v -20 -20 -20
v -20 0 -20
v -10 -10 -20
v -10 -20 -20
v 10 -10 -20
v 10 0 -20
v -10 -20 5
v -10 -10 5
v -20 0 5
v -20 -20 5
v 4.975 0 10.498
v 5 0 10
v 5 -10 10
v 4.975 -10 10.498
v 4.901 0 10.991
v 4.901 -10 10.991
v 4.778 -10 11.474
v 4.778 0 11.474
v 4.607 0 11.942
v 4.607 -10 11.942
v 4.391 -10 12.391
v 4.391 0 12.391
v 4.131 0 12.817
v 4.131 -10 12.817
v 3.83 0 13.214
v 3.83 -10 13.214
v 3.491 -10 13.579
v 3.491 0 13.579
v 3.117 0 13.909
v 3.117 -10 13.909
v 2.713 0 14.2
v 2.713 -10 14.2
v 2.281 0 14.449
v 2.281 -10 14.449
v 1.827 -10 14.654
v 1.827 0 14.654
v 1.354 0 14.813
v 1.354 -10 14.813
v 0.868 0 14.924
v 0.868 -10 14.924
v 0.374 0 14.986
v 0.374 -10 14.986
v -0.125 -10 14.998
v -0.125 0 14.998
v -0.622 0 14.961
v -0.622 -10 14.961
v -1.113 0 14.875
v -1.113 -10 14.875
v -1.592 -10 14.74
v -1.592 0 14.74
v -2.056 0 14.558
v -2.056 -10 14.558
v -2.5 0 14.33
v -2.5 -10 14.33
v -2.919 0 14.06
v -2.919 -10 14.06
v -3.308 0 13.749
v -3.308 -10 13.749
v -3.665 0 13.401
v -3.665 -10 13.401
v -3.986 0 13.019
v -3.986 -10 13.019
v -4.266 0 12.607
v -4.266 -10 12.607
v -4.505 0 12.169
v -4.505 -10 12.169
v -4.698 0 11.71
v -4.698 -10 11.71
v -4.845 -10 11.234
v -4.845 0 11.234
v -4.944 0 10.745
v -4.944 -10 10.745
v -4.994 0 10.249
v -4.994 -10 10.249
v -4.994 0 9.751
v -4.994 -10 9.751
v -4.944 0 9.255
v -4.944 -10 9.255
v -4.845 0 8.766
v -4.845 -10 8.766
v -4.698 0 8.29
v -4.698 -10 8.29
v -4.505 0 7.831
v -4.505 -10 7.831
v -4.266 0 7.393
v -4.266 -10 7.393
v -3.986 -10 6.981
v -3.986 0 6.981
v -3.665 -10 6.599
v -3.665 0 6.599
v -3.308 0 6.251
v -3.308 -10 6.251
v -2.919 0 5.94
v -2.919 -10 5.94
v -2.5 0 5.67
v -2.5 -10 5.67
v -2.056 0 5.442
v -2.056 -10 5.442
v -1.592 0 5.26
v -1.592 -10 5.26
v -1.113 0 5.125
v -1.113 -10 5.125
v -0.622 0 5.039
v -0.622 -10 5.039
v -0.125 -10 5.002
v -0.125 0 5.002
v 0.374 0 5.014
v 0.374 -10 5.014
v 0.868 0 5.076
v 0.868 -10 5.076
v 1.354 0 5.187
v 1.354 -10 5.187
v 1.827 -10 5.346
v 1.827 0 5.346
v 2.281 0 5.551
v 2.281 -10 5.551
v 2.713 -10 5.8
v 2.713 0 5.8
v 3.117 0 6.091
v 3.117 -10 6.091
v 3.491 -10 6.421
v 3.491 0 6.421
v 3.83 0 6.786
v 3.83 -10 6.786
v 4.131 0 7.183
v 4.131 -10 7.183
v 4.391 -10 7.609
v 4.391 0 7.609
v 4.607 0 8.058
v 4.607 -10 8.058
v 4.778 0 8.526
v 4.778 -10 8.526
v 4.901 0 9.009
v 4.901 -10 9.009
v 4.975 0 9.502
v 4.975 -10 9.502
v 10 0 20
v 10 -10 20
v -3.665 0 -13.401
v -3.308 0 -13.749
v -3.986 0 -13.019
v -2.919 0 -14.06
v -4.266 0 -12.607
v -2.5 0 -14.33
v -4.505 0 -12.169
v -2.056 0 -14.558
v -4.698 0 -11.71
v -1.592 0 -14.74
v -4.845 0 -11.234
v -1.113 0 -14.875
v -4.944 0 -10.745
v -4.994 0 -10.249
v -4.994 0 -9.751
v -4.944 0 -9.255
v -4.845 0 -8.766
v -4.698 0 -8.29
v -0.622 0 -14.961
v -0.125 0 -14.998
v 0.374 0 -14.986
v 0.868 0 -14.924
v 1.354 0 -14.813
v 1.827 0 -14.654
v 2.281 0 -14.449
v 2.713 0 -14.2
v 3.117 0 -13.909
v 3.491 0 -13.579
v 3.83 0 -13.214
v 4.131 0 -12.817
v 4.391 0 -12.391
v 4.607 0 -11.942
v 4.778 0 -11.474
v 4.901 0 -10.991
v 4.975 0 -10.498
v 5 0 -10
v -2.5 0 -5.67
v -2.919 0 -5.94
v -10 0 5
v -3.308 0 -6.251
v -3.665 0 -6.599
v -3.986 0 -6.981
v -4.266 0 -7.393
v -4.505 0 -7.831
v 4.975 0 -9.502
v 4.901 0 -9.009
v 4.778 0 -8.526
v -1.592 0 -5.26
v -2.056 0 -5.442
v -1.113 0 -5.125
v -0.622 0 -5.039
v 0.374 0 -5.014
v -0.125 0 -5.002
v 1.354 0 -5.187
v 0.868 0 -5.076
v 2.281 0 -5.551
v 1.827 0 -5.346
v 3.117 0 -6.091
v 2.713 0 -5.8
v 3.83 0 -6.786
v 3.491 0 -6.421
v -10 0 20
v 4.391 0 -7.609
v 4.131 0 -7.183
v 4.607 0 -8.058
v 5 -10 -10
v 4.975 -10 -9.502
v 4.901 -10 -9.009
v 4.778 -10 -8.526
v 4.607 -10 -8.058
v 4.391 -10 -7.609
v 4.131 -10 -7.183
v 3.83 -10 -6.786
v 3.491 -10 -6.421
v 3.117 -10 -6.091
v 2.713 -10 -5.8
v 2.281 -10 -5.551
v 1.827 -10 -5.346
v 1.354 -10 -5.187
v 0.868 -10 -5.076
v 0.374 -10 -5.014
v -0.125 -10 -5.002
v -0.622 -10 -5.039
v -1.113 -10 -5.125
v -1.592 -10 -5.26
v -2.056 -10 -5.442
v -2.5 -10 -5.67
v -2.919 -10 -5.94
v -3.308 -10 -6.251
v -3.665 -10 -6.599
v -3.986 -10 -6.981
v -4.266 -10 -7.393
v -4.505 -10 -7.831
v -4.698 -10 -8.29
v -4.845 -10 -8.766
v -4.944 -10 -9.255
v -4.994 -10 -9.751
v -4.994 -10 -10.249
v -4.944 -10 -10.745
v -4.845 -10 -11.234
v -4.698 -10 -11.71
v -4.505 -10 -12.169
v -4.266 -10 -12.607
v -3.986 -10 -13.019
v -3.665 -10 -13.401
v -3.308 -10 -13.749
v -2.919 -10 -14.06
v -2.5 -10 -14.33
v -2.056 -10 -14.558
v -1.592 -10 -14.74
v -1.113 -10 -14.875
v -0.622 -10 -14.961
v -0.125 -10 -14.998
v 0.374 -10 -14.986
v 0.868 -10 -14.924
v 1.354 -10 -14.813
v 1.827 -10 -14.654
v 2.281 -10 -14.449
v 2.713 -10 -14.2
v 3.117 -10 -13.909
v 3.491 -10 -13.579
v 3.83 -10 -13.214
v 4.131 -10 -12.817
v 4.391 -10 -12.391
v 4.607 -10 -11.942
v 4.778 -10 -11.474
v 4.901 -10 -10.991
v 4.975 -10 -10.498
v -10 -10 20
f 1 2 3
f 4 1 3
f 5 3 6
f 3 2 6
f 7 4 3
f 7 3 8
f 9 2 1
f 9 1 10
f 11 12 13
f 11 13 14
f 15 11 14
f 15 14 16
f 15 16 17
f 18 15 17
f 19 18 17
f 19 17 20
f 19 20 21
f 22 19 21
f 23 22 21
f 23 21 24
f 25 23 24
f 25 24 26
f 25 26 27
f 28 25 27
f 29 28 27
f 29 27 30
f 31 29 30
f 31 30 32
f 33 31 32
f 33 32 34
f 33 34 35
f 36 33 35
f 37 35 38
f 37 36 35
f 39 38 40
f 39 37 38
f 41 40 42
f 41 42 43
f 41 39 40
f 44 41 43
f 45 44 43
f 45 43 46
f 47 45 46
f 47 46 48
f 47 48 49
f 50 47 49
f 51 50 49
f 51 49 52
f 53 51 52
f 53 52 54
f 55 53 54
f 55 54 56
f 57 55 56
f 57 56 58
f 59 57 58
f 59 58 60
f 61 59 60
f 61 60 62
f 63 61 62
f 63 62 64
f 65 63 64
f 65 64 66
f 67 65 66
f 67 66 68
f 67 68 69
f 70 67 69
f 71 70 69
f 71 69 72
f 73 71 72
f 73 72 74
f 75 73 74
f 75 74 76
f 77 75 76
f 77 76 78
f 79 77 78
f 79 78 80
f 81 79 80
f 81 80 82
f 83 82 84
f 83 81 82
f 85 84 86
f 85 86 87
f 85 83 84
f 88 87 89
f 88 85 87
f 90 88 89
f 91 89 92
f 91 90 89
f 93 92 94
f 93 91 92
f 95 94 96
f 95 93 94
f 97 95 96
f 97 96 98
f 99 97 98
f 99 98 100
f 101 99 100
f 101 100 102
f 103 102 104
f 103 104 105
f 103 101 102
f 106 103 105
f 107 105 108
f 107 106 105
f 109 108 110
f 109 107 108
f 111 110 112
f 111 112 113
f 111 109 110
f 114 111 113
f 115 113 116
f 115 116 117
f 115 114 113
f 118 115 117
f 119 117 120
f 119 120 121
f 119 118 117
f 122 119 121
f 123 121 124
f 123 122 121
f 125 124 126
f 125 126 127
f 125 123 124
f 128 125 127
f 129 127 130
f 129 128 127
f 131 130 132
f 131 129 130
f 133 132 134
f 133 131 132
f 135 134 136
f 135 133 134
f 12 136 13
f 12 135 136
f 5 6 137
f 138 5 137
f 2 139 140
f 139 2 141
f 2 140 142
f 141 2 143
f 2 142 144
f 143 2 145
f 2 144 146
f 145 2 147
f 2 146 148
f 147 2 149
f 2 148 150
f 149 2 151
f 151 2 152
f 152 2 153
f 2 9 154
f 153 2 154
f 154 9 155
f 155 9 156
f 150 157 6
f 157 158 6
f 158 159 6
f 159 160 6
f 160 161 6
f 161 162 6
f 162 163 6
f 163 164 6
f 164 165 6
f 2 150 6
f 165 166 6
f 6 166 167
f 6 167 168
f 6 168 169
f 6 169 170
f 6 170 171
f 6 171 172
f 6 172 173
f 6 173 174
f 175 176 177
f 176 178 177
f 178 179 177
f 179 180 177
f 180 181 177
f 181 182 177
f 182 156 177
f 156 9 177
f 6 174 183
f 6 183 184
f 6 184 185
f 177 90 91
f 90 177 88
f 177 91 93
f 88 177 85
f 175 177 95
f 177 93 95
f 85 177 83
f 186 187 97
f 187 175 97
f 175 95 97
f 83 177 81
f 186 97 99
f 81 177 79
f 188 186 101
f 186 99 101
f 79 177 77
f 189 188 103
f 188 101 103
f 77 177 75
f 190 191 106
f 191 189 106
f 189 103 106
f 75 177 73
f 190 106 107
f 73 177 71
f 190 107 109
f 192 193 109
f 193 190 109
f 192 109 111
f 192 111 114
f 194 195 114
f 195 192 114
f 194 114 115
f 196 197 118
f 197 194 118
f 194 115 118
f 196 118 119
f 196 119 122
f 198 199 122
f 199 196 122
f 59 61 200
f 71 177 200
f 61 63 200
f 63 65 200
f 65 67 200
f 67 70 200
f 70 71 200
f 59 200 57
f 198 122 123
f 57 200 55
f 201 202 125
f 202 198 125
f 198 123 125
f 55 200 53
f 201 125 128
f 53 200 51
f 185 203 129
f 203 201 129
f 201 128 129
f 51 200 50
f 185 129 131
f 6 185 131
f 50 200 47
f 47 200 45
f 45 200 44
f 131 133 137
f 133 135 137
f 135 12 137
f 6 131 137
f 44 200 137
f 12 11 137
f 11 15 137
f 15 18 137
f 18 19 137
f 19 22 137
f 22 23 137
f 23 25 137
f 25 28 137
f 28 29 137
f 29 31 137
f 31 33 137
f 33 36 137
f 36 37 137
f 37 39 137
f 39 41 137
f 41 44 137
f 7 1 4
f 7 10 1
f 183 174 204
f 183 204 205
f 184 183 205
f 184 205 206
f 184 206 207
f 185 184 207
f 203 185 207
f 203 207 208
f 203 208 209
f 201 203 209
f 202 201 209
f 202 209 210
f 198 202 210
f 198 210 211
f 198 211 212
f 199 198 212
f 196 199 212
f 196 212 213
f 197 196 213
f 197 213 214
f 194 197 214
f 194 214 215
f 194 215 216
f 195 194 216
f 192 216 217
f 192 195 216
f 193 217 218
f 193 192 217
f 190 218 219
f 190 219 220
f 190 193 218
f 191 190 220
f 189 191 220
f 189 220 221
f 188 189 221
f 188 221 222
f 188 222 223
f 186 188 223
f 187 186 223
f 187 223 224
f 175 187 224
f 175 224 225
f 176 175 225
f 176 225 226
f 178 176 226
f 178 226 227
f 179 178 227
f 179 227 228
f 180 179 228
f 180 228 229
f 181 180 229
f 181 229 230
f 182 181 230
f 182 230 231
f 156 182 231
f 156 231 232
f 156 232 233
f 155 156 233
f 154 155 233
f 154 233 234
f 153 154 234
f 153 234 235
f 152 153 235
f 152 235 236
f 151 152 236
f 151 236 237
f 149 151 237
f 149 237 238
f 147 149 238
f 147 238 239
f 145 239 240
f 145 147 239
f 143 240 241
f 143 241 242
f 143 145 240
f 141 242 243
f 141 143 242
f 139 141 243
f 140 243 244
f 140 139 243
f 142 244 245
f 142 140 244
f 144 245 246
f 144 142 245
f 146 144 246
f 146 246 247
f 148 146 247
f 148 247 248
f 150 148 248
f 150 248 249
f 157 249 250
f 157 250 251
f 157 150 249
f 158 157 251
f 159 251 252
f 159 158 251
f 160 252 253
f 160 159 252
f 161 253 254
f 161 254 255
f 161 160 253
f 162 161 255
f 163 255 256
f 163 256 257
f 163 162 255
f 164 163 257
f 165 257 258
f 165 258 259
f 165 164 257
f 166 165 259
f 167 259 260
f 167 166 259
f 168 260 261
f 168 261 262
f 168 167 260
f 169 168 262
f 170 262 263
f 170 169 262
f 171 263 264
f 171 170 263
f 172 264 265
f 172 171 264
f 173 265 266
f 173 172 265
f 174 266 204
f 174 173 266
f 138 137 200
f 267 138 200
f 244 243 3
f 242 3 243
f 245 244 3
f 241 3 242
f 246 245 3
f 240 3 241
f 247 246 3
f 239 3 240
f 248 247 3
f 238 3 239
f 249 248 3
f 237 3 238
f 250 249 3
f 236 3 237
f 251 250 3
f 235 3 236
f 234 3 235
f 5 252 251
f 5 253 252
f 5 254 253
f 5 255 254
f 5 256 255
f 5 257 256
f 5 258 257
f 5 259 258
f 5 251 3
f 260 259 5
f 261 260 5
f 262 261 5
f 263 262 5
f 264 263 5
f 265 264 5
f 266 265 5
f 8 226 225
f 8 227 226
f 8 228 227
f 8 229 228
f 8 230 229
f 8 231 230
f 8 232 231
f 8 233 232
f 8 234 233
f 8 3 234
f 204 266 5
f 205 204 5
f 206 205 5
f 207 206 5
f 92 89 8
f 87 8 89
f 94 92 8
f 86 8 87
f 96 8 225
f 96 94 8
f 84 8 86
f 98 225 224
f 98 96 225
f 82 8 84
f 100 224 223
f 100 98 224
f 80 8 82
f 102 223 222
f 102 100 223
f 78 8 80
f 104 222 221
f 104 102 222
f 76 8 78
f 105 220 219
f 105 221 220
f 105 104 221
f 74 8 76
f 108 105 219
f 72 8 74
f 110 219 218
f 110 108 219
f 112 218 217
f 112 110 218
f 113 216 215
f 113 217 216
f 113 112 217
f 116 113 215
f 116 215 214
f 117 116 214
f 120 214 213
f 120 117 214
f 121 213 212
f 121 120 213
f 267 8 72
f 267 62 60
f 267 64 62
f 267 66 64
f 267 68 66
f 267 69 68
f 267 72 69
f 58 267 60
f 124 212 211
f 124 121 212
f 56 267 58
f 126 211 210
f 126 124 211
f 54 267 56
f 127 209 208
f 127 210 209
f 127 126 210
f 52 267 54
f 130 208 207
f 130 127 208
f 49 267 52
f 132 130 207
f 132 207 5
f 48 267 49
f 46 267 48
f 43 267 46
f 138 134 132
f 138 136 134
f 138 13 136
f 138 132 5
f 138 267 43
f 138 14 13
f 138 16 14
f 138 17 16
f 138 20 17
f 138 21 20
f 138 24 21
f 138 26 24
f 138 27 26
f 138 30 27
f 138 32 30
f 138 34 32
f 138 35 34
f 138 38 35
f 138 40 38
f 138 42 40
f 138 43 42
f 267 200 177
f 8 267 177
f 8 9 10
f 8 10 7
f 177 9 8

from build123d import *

# Parameters (mm, degrees)
F0_R      = 5
F1_DEPTH  = 15
F0_W      = 10
F0_H      = 25
F1_FACE_W = 20
F1_FACE_H = 40
F1_FACE_R = 5
F2_DEPTH  = 20
F3_DEPTH  = 25


with BuildPart() as f1:
    # F0 (on Front) → F1 (new body)
    with BuildSketch(Plane.XZ):
        Polygon((10, -20), (10, 20), (-10, 20), (-10, 5), (-10, -20), align=None)
        with Locations((0, -10)):
            Circle(F0_R, mode=Mode.SUBTRACT)
        with Locations((0, 10)):
            Circle(F0_R, mode=Mode.SUBTRACT)
    extrude(amount=F1_DEPTH)

    # F0 (on Front) + F1_face (on face) → F2 (join)
    with BuildSketch(Plane.XZ):
        Polygon((10, -20), (10, 20), (-10, 20), (-10, 5), (-10, -20), align=None)
        with Locations((0, -10)):
            Circle(F0_R, mode=Mode.SUBTRACT)
        with Locations((0, 10)):
            Circle(F0_R, mode=Mode.SUBTRACT)
        with Locations((-15, -7.5)):
            Rectangle(F0_W, F0_H)
    with BuildSketch(Plane.XZ.offset(15)):
        Rectangle(F1_FACE_W, F1_FACE_H)
        with Locations((0, -10)):
            Circle(F1_FACE_R, mode=Mode.SUBTRACT)
        with Locations((0, 10)):
            Circle(F1_FACE_R, mode=Mode.SUBTRACT)
    extrude(amount=F2_DEPTH)

    # F3 (cut): a face of the model
    f3_faces = [f1.faces().sort_by_distance(p)[0] for p in [
        (0, -35, 0),
    ]]
    extrude(f3_faces, amount=-F3_DEPTH, mode=Mode.SUBTRACT)


solid = f1.part
